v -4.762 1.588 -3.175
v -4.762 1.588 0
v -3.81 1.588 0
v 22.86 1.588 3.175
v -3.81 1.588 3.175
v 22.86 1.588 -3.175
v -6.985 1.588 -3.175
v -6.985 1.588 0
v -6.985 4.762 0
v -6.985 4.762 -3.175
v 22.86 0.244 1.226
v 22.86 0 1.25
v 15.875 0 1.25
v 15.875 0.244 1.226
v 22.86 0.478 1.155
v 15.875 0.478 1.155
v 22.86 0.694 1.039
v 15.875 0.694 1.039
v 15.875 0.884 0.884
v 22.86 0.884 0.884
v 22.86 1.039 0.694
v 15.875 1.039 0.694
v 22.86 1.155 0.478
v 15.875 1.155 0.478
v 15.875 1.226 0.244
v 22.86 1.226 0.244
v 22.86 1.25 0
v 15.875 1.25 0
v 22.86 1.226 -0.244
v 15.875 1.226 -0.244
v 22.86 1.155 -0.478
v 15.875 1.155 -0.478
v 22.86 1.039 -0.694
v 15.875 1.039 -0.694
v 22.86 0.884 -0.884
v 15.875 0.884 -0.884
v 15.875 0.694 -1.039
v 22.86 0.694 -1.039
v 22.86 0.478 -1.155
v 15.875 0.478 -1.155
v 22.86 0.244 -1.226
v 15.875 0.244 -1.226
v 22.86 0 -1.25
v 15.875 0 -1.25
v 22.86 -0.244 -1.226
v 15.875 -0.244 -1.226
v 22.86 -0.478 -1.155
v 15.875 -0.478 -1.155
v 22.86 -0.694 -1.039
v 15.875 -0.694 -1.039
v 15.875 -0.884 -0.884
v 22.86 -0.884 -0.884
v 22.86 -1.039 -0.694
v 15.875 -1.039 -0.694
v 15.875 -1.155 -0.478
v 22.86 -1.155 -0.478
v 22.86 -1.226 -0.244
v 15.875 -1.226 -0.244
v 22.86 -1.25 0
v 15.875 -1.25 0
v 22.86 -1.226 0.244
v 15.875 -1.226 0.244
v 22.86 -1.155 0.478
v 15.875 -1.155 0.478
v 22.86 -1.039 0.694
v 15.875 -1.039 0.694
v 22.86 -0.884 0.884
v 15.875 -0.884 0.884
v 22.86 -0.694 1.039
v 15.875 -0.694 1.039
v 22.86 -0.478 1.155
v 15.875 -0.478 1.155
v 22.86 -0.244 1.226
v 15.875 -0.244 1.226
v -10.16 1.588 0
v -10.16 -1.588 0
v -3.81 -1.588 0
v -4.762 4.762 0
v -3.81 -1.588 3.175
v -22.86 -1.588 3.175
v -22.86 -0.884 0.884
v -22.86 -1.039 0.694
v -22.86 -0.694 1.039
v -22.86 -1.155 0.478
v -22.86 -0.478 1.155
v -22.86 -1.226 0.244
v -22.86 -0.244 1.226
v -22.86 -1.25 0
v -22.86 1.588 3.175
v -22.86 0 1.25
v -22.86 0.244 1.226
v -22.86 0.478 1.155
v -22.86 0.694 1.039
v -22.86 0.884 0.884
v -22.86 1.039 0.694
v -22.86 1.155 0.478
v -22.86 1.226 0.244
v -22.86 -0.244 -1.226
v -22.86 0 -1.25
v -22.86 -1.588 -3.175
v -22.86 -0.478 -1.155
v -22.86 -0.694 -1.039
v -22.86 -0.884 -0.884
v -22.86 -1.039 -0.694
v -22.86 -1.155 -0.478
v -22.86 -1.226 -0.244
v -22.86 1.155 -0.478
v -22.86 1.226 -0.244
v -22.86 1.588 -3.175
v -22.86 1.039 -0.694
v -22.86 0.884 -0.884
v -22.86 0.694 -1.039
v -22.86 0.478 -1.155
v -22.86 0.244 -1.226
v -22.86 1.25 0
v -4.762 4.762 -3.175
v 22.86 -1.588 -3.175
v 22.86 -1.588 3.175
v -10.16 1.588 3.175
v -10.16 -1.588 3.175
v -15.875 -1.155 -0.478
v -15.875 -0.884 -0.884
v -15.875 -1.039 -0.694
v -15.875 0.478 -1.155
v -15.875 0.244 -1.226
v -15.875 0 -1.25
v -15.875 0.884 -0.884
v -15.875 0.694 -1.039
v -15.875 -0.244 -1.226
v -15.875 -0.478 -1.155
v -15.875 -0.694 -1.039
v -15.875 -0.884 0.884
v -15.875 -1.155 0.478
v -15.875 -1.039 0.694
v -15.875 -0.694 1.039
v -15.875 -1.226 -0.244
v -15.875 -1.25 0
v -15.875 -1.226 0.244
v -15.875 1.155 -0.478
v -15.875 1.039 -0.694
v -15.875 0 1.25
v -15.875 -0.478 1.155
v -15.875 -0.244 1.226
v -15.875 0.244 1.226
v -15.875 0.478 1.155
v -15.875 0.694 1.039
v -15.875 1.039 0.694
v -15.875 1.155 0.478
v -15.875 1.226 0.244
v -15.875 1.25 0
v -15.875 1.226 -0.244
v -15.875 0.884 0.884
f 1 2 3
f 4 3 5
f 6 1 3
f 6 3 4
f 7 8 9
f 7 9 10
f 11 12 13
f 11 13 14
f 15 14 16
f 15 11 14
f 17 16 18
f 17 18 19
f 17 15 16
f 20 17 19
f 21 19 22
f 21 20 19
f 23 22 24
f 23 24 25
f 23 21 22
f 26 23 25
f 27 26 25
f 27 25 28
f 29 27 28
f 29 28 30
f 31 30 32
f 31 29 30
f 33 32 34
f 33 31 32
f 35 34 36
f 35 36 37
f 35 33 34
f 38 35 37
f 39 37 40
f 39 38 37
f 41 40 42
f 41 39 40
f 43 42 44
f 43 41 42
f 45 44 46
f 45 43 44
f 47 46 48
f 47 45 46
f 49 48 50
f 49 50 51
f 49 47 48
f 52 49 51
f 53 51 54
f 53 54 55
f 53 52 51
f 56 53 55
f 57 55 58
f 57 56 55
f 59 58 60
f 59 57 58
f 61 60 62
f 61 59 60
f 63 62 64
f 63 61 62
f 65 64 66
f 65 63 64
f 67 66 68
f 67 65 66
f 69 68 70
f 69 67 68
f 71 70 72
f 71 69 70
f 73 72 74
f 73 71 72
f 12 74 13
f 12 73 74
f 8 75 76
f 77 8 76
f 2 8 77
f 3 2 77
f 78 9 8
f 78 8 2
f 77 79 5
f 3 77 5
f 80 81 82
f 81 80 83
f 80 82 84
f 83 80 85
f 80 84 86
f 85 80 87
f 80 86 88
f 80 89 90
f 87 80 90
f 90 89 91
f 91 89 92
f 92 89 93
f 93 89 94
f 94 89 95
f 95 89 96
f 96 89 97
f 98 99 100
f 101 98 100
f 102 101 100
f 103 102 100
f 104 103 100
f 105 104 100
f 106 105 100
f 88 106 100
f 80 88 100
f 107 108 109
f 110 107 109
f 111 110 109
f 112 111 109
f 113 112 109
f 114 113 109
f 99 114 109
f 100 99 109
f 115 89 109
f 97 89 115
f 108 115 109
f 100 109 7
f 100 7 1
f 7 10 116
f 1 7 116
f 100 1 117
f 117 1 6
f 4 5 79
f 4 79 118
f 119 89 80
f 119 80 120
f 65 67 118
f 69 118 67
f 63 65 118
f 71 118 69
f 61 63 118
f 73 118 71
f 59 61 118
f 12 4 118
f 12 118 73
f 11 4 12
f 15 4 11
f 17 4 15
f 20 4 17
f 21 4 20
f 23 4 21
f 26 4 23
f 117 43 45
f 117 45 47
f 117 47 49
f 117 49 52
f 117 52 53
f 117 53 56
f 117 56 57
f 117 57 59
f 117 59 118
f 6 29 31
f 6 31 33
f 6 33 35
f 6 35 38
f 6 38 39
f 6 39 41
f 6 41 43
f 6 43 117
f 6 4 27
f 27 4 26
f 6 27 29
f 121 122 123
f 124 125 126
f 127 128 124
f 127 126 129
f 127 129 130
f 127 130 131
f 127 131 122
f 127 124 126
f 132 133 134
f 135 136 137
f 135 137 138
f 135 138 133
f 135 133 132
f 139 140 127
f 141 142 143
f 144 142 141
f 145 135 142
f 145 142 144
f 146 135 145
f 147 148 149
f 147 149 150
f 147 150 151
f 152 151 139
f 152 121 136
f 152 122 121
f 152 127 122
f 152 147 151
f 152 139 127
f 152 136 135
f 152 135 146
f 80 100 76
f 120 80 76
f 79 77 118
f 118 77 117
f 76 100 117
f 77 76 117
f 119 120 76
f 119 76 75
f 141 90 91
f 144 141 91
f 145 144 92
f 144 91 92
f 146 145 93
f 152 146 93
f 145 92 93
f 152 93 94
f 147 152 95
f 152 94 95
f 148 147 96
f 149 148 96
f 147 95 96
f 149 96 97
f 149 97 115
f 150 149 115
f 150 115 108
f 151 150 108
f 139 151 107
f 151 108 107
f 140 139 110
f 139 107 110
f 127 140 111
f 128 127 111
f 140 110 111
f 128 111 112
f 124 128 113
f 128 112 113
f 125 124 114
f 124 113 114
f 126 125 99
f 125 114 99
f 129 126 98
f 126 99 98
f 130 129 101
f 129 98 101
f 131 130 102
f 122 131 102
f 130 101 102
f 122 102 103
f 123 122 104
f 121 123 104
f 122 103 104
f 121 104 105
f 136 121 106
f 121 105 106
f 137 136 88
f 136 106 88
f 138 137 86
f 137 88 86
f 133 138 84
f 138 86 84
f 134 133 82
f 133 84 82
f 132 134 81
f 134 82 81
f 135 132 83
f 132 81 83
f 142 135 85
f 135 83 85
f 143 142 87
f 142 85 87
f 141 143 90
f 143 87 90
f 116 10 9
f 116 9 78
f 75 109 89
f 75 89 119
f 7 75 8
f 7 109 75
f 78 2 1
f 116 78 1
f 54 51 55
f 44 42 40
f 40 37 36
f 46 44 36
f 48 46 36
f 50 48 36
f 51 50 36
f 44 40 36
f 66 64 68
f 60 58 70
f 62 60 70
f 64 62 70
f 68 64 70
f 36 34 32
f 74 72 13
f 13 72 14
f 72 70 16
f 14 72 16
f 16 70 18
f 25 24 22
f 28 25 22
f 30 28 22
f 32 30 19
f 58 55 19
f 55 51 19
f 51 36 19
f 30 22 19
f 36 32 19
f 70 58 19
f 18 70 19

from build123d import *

# Parameters (mm, degrees)
SKETCH1_W           = 45.72
SKETCH1_H           = 6.35
BOSS_EXTRUDE1_DEPTH = 1.5875
SKETCH4_W           = 6.35
SKETCH4_H           = 3.175
CUT_EXTRUDE1_DEPTH  = 3.175
SKETCH5_W           = 2.2225
SKETCH5_H           = 3.175
BOSS_EXTRUDE3_DEPTH = 3.175
SKETCH3_R           = 1.25
CUT_EXTRUDE2_DEPTH  = 6.985


with BuildPart() as part:
    # Sketch1 → Boss-Extrude1 (new body, symmetric)
    with BuildSketch(Plane(origin=(0, 0, 0), x_dir=(1, 0, 0), z_dir=(0, 1, 0))):
        Rectangle(SKETCH1_W, SKETCH1_H)
    extrude(amount=BOSS_EXTRUDE1_DEPTH, both=True)

    # Sketch4 → Cut-Extrude1 (cut)
    with BuildSketch(Plane.XY.offset(3.175)):
        with Locations((-6.985, 0)):
            Rectangle(SKETCH4_W, SKETCH4_H)
    extrude(amount=-CUT_EXTRUDE1_DEPTH, mode=Mode.SUBTRACT)

    # Sketch5 → Boss-Extrude3 (add)
    with BuildSketch(Plane(origin=(0, 1.5875, 0), x_dir=(1, 0, 0), z_dir=(0, 1, 0))):
        with Locations((-5.87375, 1.5875)):
            Rectangle(SKETCH5_W, SKETCH5_H)
    extrude(amount=BOSS_EXTRUDE3_DEPTH)

    # Sketch3 → Cut-Extrude2 (cut)
    with BuildSketch(Plane.ZY.offset(22.86)):
        Circle(SKETCH3_R)
    cut_extrude2 = extrude(amount=-CUT_EXTRUDE2_DEPTH, mode=Mode.SUBTRACT)

    # Mirror1: Cut-Extrude2 across plane
    add(cut_extrude2.mirror(Plane(origin=(0, 0, 0), x_dir=(0, 0, 1), z_dir=(1, 0, 0))), mode=Mode.SUBTRACT)


solid = part.part
